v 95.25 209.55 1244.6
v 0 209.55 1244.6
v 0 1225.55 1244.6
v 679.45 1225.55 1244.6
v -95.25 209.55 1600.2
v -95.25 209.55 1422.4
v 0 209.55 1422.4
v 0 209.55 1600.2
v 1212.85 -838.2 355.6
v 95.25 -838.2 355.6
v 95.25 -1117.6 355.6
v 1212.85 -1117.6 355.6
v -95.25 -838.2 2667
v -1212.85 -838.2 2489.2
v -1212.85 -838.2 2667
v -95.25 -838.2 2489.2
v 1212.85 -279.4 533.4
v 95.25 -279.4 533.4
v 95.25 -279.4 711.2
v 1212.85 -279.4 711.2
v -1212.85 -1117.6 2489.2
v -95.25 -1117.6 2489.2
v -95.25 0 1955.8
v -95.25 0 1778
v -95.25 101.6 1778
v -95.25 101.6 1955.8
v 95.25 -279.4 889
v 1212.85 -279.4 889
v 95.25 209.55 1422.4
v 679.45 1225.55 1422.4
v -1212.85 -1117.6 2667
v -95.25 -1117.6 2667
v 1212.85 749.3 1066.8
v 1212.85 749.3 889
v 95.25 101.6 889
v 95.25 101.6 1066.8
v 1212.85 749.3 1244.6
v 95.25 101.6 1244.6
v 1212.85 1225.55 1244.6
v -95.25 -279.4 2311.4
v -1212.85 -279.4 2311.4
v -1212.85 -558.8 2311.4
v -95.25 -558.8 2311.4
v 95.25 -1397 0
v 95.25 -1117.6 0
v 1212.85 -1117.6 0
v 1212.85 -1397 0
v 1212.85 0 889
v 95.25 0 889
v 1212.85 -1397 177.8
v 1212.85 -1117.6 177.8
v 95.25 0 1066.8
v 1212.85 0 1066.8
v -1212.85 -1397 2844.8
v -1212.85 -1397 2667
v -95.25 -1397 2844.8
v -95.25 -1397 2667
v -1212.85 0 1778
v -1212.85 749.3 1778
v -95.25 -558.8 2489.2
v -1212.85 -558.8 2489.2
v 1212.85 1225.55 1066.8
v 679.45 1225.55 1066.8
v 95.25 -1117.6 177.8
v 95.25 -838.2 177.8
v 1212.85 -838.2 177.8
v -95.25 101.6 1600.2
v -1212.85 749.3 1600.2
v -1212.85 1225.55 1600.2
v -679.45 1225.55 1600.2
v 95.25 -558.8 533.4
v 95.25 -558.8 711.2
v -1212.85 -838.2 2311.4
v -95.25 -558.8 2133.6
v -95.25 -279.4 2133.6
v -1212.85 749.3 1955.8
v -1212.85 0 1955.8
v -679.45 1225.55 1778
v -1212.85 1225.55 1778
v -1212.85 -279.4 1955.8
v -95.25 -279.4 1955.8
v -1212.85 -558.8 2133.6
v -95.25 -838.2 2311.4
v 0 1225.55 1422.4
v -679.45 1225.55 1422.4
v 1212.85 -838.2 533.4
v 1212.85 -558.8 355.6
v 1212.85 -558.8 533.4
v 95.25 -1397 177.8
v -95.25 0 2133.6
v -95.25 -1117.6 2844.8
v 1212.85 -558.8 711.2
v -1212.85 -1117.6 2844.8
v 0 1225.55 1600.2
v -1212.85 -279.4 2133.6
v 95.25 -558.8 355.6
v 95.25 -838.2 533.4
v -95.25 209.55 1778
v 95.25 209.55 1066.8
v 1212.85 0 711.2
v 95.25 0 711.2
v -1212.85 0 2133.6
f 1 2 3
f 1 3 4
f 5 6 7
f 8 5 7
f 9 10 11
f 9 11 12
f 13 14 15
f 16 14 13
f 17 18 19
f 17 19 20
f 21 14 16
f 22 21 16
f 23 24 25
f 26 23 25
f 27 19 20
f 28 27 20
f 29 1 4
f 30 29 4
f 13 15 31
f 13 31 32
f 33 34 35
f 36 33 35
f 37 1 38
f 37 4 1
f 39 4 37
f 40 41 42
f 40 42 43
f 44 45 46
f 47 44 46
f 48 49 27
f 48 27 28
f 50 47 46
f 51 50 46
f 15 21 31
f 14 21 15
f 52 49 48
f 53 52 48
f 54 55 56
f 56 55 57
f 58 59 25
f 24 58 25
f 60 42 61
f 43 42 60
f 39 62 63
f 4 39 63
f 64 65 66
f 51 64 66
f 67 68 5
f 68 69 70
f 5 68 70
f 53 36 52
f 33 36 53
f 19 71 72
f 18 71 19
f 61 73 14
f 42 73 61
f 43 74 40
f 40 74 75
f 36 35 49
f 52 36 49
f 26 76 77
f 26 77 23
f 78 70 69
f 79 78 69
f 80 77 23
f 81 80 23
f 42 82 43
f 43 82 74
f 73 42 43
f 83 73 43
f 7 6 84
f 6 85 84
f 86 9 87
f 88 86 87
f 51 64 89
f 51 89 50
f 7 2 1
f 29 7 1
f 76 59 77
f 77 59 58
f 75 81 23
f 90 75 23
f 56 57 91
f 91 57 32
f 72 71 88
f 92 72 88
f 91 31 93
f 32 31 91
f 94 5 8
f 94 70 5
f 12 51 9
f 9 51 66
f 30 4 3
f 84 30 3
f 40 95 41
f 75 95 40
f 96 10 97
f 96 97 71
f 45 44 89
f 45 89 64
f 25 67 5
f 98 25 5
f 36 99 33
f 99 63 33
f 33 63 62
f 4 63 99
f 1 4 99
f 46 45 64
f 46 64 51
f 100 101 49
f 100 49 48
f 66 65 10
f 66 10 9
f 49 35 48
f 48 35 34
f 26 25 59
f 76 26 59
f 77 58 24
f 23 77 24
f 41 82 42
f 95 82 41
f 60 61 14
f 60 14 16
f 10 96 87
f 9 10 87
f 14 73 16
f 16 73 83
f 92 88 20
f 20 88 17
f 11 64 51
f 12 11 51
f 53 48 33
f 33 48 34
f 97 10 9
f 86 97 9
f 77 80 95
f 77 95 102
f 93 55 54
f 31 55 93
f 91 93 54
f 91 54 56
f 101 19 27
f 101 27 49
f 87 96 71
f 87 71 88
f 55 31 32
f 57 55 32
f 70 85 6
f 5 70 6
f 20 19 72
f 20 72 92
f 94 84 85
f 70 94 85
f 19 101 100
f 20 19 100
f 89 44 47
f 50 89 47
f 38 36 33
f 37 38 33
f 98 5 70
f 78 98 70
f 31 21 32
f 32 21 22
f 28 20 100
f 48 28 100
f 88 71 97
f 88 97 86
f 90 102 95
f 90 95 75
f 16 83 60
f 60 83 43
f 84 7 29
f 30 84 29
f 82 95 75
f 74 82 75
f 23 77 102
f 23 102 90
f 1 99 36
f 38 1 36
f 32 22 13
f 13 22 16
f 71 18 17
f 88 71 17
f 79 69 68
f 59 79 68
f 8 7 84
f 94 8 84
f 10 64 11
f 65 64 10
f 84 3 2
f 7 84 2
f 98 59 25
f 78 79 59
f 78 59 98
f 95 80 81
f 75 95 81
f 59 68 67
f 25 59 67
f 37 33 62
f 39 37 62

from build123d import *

# Parameters (mm, degrees)
F1_W      = 1117.6
F1_H      = 279.4
F3_DEPTH  = 177.8
F4_START  = 177.8
F4_DEPTH  = 177.8
F5_START  = 355.6
F5_DEPTH  = 177.8
F6_START  = 533.4
F6_DEPTH  = 177.8
F7_START  = 711.2
F7_DEPTH  = 177.8
F8_START  = 889
F8_DEPTH  = 177.8
F9_START  = 1066.8
F9_DEPTH  = 177.8
F10_START = 1244.6
F10_DEPTH = 177.8
F11_START = 1422.4
F11_DEPTH = 177.8
F12_START = 1600.2
F12_DEPTH = 177.8
F13_START = 1778
F13_DEPTH = 177.8
F14_START = 1955.8
F2_W      = 1117.6
F2_H      = 279.4
F14_DEPTH = 177.8
F15_START = 2133.6
F15_DEPTH = 177.8
F16_START = 2311.4
F16_DEPTH = 177.8
F17_START = 2489.2
F17_DEPTH = 177.8
F18_START = 2667
F18_DEPTH = 177.8


with BuildPart() as f3:
    # F1 (on Top) → F3 (new body)
    with BuildSketch(Plane.XY):
        with Locations((654.05, -1257.3)):
            Rectangle(F1_W, F1_H)
    extrude(amount=F3_DEPTH)


with BuildPart() as f4:
    # F1 (on Top) → F4 (new body)
    with BuildSketch(Plane.XY.offset(F4_START)):
        with Locations((654.05, -977.9)):
            Rectangle(F1_W, F1_H)
    extrude(amount=F4_DEPTH)


with BuildPart() as f5:
    # F1 (on Top) → F5 (new body)
    with BuildSketch(Plane.XY.offset(F5_START)):
        with Locations((654.05, -698.5)):
            Rectangle(F1_W, F1_H)
    extrude(amount=F5_DEPTH)


with BuildPart() as f6:
    # F1 (on Top) → F6 (new body)
    with BuildSketch(Plane.XY.offset(F6_START)):
        with Locations((654.05, -419.1)):
            Rectangle(F1_W, F1_H)
    extrude(amount=F6_DEPTH)


with BuildPart() as f7:
    # F1 (on Top) → F7 (new body)
    with BuildSketch(Plane.XY.offset(F7_START)):
        with Locations((654.05, -139.7)):
            Rectangle(F1_W, F1_H)
    extrude(amount=F7_DEPTH)


with BuildPart() as f8:
    # F1 (on Top) → F8 (new body)
    with BuildSketch(Plane.XY.offset(F8_START)):
        Polygon((95.25, 101.6), (95.25, 0), (1212.85, 0), (1212.85, 749.3), align=None)
    extrude(amount=F8_DEPTH)


with BuildPart() as f9:
    # F1 (on Top) → F9 (new body)
    with BuildSketch(Plane.XY.offset(F9_START)):
        Polygon((95.25, 209.55), (95.25, 101.6), (1212.85, 749.3), (1212.85, 1225.55), (679.45, 1225.55), align=None)
    extrude(amount=F9_DEPTH)


with BuildPart() as f10:
    # F1 (on Top) → F10 (new body)
    with BuildSketch(Plane.XY.offset(F10_START)):
        Polygon((0, 209.55), (95.25, 209.55), (679.45, 1225.55), (0, 1225.55), align=None)
    extrude(amount=F10_DEPTH)


with BuildPart() as f11:
    # F2 (on Top) → F11 (new body)
    with BuildSketch(Plane.XY.offset(F11_START)):
        Polygon((-95.25, 209.55), (0, 209.55), (0, 1225.55), (-679.45, 1225.55), align=None)
    extrude(amount=F11_DEPTH)


with BuildPart() as f12:
    # F2 (on Top) → F12 (new body)
    with BuildSketch(Plane.XY.offset(F12_START)):
        Polygon((-95.25, 101.6), (-95.25, 209.55), (-679.45, 1225.55), (-1212.85, 1225.55), (-1212.85, 749.3), align=None)
    extrude(amount=F12_DEPTH)


with BuildPart() as f13:
    # F2 (on Top) → F13 (new body)
    with BuildSketch(Plane.XY.offset(F13_START)):
        Polygon((-95.25, 0), (-95.25, 101.6), (-1212.85, 749.3), (-1212.85, 0), align=None)
    extrude(amount=F13_DEPTH)


with BuildPart() as f14:
    # F2 (on Top) → F14 (new body)
    with BuildSketch(Plane.XY.offset(F14_START)):
        with Locations((-654.05, -139.7)):
            Rectangle(F2_W, F2_H)
    extrude(amount=F14_DEPTH)


with BuildPart() as f15:
    # F2 (on Top) → F15 (new body)
    with BuildSketch(Plane.XY.offset(F15_START)):
        with Locations((-654.05, -419.1)):
            Rectangle(F2_W, F2_H)
    extrude(amount=F15_DEPTH)


with BuildPart() as f16:
    # F2 (on Top) → F16 (new body)
    with BuildSketch(Plane.XY.offset(F16_START)):
        with Locations((-654.05, -698.5)):
            Rectangle(F2_W, F2_H)
    extrude(amount=F16_DEPTH)

    # F2 (on Top) → F17 (join)
    with BuildSketch(Plane.XY.offset(F17_START)):
        with Locations((-654.05, -977.9)):
            Rectangle(F2_W, F2_H)
    extrude(amount=F17_DEPTH)


with BuildPart() as f18:
    # F2 (on Top) → F18 (new body)
    with BuildSketch(Plane.XY.offset(F18_START)):
        with Locations((-654.05, -1257.3)):
            Rectangle(F2_W, F2_H)
    extrude(amount=F18_DEPTH)


solid = Compound([f3.part, f4.part, f5.part, f6.part, f7.part, f8.part, f9.part, f10.part, f11.part, f12.part, f13.part, f14.part, f15.part, f16.part, f18.part])
